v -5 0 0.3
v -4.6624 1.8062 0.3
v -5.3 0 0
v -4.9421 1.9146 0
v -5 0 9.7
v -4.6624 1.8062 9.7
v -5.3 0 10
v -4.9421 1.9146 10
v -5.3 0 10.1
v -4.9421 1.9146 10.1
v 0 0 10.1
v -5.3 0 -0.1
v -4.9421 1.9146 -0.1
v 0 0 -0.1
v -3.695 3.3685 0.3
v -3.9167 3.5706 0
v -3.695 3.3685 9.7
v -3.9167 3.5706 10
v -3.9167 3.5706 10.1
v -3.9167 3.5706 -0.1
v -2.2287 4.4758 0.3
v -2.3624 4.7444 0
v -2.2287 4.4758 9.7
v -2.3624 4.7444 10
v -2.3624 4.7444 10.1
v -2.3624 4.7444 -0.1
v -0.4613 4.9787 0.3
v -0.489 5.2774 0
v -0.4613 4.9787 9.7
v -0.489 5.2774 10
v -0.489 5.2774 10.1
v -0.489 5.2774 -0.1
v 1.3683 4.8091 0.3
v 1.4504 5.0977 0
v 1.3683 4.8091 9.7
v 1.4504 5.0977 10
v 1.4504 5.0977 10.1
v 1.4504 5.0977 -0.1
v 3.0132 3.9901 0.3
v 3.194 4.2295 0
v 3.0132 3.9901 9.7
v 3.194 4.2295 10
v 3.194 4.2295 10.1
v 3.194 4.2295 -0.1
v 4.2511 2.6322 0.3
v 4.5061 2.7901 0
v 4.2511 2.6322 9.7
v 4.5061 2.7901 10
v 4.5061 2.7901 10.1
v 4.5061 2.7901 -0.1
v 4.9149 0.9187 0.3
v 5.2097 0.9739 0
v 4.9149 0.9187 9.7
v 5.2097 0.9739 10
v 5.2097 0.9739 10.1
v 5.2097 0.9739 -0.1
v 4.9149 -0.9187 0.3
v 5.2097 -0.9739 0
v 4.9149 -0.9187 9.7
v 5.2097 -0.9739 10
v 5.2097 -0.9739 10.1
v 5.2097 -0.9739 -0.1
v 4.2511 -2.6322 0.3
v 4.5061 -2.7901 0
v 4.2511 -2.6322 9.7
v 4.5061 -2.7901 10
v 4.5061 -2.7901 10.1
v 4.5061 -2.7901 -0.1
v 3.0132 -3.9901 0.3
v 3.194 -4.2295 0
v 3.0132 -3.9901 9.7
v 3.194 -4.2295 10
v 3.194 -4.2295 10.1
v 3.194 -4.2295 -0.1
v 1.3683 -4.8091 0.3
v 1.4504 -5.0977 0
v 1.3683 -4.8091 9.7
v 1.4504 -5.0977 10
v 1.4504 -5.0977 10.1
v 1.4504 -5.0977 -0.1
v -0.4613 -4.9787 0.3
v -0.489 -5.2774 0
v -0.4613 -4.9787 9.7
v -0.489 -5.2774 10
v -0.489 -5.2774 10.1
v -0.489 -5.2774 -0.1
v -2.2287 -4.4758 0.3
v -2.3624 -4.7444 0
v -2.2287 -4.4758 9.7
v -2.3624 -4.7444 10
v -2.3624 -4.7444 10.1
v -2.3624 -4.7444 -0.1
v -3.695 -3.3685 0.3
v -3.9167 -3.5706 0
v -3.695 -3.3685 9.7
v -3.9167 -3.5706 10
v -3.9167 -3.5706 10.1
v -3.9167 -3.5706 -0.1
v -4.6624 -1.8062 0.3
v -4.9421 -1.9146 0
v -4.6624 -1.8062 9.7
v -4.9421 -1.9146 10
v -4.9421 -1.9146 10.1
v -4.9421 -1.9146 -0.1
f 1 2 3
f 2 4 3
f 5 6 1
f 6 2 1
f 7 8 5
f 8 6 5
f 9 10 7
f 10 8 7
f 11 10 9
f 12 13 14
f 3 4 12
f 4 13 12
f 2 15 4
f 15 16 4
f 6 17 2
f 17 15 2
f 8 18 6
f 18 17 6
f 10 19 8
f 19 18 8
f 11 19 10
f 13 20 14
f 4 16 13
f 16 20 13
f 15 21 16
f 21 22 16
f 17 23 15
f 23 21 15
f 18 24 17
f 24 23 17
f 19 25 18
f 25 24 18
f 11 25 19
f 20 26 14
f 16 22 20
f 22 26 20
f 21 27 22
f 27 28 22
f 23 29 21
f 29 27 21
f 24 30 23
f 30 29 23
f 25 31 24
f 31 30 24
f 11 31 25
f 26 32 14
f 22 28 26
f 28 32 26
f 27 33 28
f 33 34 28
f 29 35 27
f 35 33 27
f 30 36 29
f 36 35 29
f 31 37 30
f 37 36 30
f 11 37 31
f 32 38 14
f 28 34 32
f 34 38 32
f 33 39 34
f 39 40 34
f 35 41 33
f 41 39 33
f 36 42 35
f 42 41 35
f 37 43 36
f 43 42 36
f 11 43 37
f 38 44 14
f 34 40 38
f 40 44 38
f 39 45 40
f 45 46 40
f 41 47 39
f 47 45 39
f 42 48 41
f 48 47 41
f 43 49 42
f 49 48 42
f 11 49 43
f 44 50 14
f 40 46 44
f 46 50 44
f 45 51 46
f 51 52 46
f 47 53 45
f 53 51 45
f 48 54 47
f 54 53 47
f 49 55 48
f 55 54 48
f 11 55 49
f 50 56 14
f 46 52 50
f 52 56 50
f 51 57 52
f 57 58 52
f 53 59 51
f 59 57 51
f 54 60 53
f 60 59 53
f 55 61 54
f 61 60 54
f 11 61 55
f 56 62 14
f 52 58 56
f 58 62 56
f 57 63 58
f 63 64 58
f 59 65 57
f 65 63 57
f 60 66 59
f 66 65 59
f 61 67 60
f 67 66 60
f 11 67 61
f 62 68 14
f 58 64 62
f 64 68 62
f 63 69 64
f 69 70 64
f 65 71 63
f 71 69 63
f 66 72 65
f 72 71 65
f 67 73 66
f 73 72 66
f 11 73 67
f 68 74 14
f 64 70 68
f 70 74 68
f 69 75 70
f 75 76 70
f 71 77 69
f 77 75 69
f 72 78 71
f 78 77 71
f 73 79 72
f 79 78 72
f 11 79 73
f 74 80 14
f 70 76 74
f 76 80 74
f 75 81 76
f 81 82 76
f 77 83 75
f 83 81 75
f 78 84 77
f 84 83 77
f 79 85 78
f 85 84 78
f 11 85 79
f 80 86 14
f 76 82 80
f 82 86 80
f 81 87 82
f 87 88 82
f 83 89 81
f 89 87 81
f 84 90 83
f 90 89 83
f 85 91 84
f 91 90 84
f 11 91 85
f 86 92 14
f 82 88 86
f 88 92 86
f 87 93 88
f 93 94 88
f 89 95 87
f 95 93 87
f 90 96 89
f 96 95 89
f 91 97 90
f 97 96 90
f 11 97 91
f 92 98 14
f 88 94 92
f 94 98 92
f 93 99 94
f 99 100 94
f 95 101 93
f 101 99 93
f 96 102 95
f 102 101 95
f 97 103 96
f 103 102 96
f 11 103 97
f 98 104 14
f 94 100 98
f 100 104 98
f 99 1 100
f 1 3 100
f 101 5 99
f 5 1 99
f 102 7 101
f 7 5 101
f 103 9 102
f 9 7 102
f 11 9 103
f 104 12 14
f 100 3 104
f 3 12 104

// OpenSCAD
chamferedCylinder(10,10,0.3,true);

module chamferedCylinder(h=1,d=1,chamfer=0.3,hole=false){
    //cylinder(h=h,d=d,$fn=20);
    if(hole){
        path=[[0,-0.1],[d/2+chamfer,-0.1],[d/2+chamfer,0],[d/2,chamfer],[d/2,h-chamfer],[d/2+chamfer,h],[d/2+chamfer,h+0.1],[0,h+0.1]];
    rotate_extrude() polygon(path);
        }
    else{
        path=[[0,0],[d/2-chamfer,0],[d/2,chamfer],[d/2,h-chamfer],[d/2-chamfer,h],[0,h]];
    rotate_extrude() polygon(path);
         }
}
